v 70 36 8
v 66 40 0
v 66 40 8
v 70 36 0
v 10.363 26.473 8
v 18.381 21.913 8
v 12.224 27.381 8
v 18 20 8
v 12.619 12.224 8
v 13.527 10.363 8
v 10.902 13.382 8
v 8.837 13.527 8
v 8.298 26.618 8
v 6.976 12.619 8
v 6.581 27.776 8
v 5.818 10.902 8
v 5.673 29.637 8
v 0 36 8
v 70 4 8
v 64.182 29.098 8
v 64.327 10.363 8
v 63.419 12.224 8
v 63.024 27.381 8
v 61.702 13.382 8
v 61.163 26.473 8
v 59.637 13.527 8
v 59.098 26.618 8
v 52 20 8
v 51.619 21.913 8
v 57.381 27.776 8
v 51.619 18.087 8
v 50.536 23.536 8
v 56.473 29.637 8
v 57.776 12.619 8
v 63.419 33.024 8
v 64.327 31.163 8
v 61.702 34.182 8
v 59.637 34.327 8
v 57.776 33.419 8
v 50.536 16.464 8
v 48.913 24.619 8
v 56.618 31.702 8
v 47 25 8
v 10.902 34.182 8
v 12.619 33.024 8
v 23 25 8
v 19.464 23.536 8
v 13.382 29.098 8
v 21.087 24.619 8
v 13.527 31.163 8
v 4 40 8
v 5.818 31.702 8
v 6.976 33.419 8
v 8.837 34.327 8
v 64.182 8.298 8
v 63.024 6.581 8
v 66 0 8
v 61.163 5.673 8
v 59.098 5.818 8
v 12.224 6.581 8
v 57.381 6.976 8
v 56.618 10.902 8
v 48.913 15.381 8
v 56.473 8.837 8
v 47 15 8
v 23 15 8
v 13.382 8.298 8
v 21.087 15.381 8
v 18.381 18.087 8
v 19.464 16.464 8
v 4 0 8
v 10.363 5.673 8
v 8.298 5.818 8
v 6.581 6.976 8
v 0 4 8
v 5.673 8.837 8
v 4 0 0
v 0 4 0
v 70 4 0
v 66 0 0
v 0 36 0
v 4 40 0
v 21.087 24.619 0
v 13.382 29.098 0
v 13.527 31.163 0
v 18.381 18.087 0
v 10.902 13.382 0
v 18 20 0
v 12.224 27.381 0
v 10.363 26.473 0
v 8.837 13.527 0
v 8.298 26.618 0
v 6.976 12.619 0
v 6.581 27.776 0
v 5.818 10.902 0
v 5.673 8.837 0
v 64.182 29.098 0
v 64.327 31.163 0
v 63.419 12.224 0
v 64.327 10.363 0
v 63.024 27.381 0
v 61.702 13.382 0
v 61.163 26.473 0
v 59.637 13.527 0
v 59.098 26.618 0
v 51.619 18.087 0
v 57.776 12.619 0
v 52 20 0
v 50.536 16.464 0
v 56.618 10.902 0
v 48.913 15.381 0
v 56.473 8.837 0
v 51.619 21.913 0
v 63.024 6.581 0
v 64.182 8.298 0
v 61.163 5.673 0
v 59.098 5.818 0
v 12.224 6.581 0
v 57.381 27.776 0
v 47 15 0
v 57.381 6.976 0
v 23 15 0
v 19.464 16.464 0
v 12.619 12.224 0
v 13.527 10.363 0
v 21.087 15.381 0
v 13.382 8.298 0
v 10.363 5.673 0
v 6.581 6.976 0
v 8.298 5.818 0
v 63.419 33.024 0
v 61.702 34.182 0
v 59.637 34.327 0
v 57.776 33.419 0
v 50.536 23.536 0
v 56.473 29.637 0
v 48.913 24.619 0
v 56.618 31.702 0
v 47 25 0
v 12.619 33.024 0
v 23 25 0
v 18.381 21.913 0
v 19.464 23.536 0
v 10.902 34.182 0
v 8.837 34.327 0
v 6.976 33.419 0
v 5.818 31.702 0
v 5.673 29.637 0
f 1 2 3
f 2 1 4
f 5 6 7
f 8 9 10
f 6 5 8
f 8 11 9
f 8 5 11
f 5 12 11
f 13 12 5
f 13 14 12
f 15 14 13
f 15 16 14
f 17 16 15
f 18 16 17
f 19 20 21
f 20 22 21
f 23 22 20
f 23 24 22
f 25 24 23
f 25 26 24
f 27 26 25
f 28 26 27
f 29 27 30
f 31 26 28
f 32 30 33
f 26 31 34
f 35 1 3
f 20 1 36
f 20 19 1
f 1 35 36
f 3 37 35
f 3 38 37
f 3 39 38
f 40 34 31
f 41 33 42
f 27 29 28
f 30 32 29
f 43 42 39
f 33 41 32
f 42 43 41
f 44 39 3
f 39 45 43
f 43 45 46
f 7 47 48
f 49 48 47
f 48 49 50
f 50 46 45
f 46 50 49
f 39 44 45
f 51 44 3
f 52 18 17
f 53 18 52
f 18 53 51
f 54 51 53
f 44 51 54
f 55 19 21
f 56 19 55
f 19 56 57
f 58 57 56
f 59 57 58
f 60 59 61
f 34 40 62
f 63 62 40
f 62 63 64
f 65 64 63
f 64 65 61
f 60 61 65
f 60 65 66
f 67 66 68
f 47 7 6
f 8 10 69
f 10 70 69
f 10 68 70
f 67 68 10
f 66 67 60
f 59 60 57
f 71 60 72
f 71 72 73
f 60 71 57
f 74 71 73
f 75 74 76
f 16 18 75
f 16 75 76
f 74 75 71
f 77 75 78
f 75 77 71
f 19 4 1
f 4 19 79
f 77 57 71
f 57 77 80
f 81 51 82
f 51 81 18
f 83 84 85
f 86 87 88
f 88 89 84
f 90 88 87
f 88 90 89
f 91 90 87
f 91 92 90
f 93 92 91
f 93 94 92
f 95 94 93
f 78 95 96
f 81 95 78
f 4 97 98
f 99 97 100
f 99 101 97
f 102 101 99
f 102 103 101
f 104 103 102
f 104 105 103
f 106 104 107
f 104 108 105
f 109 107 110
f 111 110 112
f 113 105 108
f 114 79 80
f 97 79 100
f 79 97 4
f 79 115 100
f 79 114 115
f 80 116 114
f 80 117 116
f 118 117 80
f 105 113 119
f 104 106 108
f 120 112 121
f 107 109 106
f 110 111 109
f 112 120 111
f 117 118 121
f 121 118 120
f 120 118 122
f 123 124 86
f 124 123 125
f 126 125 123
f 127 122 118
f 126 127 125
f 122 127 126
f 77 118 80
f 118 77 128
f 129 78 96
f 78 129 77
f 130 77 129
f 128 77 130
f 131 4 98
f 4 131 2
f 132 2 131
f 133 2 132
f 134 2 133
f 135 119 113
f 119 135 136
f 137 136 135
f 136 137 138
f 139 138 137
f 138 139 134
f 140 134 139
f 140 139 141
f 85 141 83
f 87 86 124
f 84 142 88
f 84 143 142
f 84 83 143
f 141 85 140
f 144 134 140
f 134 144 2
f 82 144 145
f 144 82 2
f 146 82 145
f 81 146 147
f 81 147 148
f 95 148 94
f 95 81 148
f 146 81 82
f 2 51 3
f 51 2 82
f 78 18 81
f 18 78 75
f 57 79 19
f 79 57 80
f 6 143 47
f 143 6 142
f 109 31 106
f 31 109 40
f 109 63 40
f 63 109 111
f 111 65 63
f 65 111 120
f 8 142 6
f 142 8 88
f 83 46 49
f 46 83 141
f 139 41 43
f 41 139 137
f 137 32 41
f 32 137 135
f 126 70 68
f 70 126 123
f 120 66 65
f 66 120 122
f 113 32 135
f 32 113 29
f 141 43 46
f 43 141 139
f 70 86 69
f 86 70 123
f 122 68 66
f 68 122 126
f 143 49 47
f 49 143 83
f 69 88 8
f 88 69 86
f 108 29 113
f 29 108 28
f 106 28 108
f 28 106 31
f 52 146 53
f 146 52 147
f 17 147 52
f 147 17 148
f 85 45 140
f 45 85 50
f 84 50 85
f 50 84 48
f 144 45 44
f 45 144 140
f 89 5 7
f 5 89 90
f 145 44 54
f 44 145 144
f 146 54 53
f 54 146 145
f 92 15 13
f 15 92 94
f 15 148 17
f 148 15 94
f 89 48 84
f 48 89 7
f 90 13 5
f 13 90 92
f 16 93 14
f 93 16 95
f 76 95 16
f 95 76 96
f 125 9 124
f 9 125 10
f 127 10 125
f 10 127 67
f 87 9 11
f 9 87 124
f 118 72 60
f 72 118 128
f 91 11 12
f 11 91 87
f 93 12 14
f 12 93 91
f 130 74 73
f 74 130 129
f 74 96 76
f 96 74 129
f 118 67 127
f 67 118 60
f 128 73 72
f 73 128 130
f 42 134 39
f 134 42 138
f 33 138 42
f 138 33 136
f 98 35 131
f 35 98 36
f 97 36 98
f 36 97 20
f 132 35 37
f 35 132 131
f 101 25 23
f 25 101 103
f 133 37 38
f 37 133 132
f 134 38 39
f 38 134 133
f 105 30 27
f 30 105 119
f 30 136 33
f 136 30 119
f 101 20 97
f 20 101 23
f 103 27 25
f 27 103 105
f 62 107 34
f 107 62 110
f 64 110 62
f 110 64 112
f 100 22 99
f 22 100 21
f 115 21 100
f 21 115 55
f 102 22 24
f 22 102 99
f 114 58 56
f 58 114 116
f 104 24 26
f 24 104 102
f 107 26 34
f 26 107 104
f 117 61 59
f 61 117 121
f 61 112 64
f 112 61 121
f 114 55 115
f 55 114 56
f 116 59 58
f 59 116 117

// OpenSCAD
$fn = 32;

// ----------------------------------------------------------------------
// Bracket plate: slot plate 70 x 40
// ----------------------------------------------------------------------

// --- parameters (mm) ---
hole_r = 4;               // bolt hole radius
plate_t = 8;              // plate thickness, Z (extrusion height)
plate_l = 70;             // plate length
plate_w = 40;             // plate width
slot_l = 24;              // slot straight length
slot_r = 5;               // slot end radius

slot_len = slot_l + 2 * slot_r;
slot_w = 2 * slot_r;
hole_d2 = 2 * hole_r;

profile = [[4, 0], [66, 0], [70, 4], [70, 36], [66, 40], [4, 40], [0, 36], [0, 4]];  // primary outline, 8 points, counter clockwise
void_1 = [[47, 15], [48.913, 15.381], [50.536, 16.464], [51.619, 18.087], [52, 20], [51.619, 21.913], [50.536, 23.536], [48.913, 24.619], [47, 25], [23, 25], [21.087, 24.619], [19.464, 23.536], [18.381, 21.913], [18, 20], [18.381, 18.087], [19.464, 16.464], [21.087, 15.381], [23, 15]];  // grip slot, 18 points
void_2 = [[13.527, 31.163], [12.619, 33.024], [10.902, 34.182], [8.837, 34.327], [6.976, 33.419], [5.818, 31.702], [5.673, 29.637], [6.581, 27.776], [8.298, 26.618], [10.363, 26.473], [12.224, 27.381], [13.382, 29.098]];  // corner hole, 12 points
void_3 = [[13.527, 10.363], [12.619, 12.224], [10.902, 13.382], [8.837, 13.527], [6.976, 12.619], [5.818, 10.902], [5.673, 8.837], [6.581, 6.976], [8.298, 5.818], [10.363, 5.673], [12.224, 6.581], [13.382, 8.298]];  // corner hole, 12 points
void_4 = [[64.327, 31.163], [63.419, 33.024], [61.702, 34.182], [59.637, 34.327], [57.776, 33.419], [56.618, 31.702], [56.473, 29.637], [57.381, 27.776], [59.098, 26.618], [61.163, 26.473], [63.024, 27.381], [64.182, 29.098]];  // corner hole, 12 points
void_5 = [[64.327, 10.363], [63.419, 12.224], [61.702, 13.382], [59.637, 13.527], [57.776, 12.619], [56.618, 10.902], [56.473, 8.837], [57.381, 6.976], [59.098, 5.818], [61.163, 5.673], [63.024, 6.581], [64.182, 8.298]];  // corner hole, 12 points

// --- the one profile operation ---
difference() {
  linear_extrude(height = plate_t) polygon(points = profile);
  translate([0, 0, -1])
    linear_extrude(height = plate_t + 2) polygon(points = void_1);
  translate([0, 0, -1])
    linear_extrude(height = plate_t + 2) polygon(points = void_2);
  translate([0, 0, -1])
    linear_extrude(height = plate_t + 2) polygon(points = void_3);
  translate([0, 0, -1])
    linear_extrude(height = plate_t + 2) polygon(points = void_4);
  translate([0, 0, -1])
    linear_extrude(height = plate_t + 2) polygon(points = void_5);
}
